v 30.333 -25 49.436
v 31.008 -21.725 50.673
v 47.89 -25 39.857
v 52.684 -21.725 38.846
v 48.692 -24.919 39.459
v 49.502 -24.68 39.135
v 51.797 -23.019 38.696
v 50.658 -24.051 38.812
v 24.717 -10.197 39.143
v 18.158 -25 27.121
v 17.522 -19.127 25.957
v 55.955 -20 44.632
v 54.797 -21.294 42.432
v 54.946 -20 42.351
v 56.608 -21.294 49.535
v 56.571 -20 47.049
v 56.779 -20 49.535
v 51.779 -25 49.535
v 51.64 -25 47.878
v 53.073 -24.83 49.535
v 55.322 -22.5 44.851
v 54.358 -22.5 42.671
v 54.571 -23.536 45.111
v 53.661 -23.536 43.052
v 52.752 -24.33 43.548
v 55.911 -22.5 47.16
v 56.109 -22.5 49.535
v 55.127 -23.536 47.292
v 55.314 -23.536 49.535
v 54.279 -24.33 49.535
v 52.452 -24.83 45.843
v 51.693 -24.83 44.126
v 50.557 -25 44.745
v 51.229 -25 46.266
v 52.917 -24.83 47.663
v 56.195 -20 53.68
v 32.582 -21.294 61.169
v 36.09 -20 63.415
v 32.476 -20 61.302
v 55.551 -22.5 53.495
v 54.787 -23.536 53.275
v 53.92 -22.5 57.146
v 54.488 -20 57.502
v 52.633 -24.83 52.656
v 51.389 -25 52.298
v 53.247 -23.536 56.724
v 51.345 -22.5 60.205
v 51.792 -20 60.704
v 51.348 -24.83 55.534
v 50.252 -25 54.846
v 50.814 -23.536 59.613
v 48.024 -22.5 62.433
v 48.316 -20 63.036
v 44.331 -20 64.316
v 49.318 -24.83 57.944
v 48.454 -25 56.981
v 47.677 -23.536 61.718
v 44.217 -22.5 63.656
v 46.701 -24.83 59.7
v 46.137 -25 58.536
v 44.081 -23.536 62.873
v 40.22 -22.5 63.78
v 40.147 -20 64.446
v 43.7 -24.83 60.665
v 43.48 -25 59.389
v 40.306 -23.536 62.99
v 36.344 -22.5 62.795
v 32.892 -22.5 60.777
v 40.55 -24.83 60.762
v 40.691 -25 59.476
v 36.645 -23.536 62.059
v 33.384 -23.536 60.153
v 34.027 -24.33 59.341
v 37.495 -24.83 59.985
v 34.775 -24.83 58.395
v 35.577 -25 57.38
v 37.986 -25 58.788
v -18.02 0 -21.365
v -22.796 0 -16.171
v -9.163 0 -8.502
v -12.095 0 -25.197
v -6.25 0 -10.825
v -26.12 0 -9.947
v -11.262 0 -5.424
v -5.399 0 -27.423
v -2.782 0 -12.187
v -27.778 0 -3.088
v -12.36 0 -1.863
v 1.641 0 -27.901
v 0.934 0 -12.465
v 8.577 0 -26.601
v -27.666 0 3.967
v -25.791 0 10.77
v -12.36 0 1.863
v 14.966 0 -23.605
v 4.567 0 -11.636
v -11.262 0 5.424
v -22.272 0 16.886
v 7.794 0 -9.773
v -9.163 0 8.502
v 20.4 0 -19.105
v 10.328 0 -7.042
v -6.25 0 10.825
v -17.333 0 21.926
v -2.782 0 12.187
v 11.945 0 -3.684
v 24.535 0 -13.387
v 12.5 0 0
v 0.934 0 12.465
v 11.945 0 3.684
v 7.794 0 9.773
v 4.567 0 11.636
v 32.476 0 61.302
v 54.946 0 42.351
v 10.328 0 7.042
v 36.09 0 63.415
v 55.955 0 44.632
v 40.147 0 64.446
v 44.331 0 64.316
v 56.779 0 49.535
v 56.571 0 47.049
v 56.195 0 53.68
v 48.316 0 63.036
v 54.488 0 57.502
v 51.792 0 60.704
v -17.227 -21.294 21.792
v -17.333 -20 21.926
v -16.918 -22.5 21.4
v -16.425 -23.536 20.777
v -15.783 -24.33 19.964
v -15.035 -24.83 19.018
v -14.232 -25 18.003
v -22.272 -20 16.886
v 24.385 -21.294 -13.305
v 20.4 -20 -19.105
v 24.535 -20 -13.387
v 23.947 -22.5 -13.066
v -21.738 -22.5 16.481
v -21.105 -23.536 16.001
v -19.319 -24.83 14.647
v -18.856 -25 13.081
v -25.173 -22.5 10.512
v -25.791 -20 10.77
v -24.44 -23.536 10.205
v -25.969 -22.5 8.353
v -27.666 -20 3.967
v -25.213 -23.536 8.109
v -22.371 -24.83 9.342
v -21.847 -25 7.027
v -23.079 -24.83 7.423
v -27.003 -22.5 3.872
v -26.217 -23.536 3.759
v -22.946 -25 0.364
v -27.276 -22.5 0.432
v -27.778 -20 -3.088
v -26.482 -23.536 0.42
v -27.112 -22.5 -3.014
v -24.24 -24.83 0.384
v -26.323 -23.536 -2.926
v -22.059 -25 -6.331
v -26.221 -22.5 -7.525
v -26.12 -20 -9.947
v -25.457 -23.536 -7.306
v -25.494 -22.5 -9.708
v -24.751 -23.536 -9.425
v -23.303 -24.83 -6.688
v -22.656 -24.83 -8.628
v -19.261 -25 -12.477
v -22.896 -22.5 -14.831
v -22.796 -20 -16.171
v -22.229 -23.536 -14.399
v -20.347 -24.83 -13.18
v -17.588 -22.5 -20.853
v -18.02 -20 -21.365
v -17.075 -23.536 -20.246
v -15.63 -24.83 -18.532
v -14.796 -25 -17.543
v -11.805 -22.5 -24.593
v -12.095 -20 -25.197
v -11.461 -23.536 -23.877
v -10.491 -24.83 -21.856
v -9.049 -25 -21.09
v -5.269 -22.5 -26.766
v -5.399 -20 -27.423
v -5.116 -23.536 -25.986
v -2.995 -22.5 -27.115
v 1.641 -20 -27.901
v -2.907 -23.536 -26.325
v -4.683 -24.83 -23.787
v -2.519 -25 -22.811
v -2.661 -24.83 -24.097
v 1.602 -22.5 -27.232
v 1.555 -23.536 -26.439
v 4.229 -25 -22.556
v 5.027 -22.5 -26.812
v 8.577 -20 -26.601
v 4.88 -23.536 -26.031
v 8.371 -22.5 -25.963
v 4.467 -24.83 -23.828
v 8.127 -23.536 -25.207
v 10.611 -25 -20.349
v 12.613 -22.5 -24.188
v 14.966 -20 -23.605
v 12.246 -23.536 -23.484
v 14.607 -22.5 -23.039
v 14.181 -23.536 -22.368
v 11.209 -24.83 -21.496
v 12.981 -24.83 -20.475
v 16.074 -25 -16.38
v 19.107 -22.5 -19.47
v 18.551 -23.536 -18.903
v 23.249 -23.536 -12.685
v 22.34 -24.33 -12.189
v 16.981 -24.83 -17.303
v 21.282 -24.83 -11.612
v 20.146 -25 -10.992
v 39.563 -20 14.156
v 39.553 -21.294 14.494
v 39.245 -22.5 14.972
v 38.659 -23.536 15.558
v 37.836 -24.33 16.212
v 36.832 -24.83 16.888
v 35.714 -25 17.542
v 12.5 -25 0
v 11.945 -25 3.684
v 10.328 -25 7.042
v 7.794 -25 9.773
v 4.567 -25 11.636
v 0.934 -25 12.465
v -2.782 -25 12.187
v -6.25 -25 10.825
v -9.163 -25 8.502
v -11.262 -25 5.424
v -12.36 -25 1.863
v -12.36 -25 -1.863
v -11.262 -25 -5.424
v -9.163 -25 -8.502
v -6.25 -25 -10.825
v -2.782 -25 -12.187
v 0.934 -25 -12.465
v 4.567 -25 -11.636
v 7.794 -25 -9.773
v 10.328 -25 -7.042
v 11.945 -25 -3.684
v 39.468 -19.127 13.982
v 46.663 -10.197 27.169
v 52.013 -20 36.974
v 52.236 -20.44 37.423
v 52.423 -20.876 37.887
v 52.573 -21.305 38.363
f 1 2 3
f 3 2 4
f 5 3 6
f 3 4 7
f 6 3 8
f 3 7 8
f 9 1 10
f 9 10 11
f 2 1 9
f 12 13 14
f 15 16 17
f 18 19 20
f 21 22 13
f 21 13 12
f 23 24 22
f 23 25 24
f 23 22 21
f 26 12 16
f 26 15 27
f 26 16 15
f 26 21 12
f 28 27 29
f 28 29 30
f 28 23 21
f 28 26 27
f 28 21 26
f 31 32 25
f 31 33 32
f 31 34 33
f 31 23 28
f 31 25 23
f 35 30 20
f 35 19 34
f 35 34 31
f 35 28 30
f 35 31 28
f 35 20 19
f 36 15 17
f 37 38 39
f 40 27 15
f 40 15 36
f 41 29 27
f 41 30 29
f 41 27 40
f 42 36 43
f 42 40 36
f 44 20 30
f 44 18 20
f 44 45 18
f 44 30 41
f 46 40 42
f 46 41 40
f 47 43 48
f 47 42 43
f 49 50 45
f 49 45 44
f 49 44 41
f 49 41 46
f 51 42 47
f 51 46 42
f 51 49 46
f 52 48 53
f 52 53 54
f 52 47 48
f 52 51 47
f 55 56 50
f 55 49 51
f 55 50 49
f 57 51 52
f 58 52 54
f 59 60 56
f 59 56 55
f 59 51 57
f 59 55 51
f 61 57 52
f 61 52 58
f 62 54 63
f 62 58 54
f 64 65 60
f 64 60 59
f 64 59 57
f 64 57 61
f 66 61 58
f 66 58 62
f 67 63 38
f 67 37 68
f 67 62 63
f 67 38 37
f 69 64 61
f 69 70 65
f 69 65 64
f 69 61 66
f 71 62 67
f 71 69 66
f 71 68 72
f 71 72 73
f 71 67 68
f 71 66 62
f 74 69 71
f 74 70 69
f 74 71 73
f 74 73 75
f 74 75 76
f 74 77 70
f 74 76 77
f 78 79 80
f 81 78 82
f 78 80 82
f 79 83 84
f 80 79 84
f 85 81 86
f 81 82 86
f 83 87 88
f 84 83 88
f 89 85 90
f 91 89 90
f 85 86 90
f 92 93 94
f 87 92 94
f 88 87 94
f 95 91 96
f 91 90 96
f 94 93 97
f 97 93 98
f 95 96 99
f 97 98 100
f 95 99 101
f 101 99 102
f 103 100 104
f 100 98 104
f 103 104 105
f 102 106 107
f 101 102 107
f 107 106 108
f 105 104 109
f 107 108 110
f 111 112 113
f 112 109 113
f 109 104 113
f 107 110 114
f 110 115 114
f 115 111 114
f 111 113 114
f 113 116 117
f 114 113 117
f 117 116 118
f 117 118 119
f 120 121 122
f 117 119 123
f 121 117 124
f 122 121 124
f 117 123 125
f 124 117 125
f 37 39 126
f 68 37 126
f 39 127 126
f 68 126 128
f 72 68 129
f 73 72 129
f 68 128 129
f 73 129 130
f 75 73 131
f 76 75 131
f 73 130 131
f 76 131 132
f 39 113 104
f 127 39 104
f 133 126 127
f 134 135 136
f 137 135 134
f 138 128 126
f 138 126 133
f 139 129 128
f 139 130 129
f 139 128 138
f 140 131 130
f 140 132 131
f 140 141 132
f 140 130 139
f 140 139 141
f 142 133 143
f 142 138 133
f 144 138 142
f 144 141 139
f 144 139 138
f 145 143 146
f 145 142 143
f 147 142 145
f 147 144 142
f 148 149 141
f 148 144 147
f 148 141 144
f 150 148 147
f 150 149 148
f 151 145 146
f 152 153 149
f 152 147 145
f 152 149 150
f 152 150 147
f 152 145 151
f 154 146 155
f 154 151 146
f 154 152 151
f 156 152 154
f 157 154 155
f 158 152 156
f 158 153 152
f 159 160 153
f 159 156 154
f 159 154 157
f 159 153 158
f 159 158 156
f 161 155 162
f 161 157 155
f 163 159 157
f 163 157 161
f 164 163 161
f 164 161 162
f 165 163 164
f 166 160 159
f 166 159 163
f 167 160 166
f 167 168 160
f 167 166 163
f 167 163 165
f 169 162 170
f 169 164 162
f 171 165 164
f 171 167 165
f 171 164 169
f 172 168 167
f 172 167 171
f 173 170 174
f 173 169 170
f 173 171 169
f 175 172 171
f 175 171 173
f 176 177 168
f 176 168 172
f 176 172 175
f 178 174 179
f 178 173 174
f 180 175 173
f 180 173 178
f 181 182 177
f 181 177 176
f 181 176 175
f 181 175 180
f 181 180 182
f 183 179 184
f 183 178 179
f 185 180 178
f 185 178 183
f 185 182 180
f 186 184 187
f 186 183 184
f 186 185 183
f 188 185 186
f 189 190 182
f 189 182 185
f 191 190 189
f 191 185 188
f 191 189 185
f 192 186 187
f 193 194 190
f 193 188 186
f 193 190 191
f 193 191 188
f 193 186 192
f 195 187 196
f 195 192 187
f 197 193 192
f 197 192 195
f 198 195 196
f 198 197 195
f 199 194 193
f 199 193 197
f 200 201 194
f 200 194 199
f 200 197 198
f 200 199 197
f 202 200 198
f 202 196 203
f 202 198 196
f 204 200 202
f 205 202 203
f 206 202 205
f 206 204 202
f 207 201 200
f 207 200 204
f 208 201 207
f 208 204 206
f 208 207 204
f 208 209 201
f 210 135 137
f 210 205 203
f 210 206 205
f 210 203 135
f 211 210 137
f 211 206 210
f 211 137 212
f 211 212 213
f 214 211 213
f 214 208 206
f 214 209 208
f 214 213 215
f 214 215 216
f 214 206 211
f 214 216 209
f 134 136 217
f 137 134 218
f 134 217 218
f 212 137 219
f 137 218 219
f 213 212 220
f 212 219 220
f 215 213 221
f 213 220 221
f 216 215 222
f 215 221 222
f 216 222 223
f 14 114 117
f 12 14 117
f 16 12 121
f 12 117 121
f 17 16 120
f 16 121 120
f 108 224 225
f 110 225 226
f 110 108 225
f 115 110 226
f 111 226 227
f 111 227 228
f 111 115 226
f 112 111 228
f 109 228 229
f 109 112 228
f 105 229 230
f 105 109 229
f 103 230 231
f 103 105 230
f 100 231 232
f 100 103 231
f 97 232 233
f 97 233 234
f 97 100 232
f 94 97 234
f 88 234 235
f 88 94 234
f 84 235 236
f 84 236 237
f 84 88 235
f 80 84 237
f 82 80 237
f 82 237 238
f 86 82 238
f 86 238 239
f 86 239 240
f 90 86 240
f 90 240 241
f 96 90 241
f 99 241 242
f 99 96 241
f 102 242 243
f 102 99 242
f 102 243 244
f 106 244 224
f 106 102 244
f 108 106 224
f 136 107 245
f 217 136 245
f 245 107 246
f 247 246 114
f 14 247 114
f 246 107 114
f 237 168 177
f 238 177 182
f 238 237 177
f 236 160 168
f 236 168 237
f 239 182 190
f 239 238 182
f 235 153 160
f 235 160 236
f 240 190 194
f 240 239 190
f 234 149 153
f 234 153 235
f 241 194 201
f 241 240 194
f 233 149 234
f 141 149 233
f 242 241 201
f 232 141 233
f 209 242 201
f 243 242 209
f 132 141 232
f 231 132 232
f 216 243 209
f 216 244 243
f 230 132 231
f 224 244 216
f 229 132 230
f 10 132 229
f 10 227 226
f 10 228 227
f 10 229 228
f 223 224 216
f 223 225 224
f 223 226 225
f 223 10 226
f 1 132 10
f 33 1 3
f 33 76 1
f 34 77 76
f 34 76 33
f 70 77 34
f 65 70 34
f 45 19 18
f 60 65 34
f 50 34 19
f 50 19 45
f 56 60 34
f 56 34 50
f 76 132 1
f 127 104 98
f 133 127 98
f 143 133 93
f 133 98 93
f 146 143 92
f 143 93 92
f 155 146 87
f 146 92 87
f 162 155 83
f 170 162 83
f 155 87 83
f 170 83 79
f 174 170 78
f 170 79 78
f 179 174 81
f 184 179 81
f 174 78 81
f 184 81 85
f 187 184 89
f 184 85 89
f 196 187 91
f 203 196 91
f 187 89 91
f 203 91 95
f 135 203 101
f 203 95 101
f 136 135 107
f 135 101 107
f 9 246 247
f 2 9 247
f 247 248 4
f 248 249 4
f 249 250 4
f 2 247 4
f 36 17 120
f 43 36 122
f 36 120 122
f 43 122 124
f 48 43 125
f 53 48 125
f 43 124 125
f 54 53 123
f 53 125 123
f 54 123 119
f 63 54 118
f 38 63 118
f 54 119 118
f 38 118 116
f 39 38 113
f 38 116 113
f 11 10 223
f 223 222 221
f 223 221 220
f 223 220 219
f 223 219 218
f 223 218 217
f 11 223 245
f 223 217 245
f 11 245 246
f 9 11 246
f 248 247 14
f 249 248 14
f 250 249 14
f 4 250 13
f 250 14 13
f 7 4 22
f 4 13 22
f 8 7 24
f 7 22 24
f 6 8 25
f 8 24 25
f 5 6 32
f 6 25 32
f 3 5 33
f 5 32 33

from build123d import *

# Parameters (mm, degrees)
F0_R     = 12.5
F1_DEPTH = 25
F3_DEPTH = 25
F4_R     = 5


with BuildPart() as f1:
    # F0 (on Front) → F1 (new body)
    with BuildSketch(Plane.XZ):
        with BuildLine():
            ThreePointArc((24.534938, -13.386702), (27.082309, -6.907643), (27.949365, 0))
            ThreePointArc((27.949365, 0), (12.18024, 25.15569), (-17.333149, 21.925531))
            ThreePointArc((-17.333149, 21.925531), (-18.01957, -21.364973), (24.534938, -13.386702))
        make_face()
        Circle(F0_R, mode=Mode.SUBTRACT)
        with BuildLine():
            ThreePointArc((-17.333149, 21.925531), (12.18024, 25.15569), (27.949365, 0))
            ThreePointArc((27.949365, 0), (27.082309, -6.907643), (24.534938, -13.386702))
            Line((24.534938, -13.386702), (54.946235, 42.350645))
            ThreePointArc((54.946235, 42.350645), (32.107876, 38.068828), (32.476267, 61.302185))
            Line((32.476267, 61.302185), (-17.333149, 21.925531))
        make_face()
        with BuildLine():
            ThreePointArc((56.778706, 49.535085), (48.315655, 63.035762), (32.476267, 61.302185))
            ThreePointArc((32.476267, 61.302185), (32.107876, 38.068828), (54.946235, 42.350645))
            ThreePointArc((54.946235, 42.350645), (56.31337, 45.827858), (56.778706, 49.535085))
        make_face()
    extrude(amount=F1_DEPTH)

    # F2 (on face) → F3 (cut)
    with BuildSketch(Plane(origin=(24.534938, 0, -13.386702), x_dir=(0, 1, 0), z_dir=(0.877835, 0, -0.478963))):
        Polygon((-19.126982, 31.178041), (-10.197443, 46.199725), (-21.724535, 59.334177), (-25, 57.925509), (-25, 32.504715), align=None)
    extrude(amount=-F3_DEPTH, mode=Mode.SUBTRACT)

    # F4
    f4_edges = [f1.edges().sort_by_distance(p)[0] for p in [
        (7.571559, -25, 41.613858),
    ]]
    fillet(f4_edges, radius=F4_R)


solid = f1.part
